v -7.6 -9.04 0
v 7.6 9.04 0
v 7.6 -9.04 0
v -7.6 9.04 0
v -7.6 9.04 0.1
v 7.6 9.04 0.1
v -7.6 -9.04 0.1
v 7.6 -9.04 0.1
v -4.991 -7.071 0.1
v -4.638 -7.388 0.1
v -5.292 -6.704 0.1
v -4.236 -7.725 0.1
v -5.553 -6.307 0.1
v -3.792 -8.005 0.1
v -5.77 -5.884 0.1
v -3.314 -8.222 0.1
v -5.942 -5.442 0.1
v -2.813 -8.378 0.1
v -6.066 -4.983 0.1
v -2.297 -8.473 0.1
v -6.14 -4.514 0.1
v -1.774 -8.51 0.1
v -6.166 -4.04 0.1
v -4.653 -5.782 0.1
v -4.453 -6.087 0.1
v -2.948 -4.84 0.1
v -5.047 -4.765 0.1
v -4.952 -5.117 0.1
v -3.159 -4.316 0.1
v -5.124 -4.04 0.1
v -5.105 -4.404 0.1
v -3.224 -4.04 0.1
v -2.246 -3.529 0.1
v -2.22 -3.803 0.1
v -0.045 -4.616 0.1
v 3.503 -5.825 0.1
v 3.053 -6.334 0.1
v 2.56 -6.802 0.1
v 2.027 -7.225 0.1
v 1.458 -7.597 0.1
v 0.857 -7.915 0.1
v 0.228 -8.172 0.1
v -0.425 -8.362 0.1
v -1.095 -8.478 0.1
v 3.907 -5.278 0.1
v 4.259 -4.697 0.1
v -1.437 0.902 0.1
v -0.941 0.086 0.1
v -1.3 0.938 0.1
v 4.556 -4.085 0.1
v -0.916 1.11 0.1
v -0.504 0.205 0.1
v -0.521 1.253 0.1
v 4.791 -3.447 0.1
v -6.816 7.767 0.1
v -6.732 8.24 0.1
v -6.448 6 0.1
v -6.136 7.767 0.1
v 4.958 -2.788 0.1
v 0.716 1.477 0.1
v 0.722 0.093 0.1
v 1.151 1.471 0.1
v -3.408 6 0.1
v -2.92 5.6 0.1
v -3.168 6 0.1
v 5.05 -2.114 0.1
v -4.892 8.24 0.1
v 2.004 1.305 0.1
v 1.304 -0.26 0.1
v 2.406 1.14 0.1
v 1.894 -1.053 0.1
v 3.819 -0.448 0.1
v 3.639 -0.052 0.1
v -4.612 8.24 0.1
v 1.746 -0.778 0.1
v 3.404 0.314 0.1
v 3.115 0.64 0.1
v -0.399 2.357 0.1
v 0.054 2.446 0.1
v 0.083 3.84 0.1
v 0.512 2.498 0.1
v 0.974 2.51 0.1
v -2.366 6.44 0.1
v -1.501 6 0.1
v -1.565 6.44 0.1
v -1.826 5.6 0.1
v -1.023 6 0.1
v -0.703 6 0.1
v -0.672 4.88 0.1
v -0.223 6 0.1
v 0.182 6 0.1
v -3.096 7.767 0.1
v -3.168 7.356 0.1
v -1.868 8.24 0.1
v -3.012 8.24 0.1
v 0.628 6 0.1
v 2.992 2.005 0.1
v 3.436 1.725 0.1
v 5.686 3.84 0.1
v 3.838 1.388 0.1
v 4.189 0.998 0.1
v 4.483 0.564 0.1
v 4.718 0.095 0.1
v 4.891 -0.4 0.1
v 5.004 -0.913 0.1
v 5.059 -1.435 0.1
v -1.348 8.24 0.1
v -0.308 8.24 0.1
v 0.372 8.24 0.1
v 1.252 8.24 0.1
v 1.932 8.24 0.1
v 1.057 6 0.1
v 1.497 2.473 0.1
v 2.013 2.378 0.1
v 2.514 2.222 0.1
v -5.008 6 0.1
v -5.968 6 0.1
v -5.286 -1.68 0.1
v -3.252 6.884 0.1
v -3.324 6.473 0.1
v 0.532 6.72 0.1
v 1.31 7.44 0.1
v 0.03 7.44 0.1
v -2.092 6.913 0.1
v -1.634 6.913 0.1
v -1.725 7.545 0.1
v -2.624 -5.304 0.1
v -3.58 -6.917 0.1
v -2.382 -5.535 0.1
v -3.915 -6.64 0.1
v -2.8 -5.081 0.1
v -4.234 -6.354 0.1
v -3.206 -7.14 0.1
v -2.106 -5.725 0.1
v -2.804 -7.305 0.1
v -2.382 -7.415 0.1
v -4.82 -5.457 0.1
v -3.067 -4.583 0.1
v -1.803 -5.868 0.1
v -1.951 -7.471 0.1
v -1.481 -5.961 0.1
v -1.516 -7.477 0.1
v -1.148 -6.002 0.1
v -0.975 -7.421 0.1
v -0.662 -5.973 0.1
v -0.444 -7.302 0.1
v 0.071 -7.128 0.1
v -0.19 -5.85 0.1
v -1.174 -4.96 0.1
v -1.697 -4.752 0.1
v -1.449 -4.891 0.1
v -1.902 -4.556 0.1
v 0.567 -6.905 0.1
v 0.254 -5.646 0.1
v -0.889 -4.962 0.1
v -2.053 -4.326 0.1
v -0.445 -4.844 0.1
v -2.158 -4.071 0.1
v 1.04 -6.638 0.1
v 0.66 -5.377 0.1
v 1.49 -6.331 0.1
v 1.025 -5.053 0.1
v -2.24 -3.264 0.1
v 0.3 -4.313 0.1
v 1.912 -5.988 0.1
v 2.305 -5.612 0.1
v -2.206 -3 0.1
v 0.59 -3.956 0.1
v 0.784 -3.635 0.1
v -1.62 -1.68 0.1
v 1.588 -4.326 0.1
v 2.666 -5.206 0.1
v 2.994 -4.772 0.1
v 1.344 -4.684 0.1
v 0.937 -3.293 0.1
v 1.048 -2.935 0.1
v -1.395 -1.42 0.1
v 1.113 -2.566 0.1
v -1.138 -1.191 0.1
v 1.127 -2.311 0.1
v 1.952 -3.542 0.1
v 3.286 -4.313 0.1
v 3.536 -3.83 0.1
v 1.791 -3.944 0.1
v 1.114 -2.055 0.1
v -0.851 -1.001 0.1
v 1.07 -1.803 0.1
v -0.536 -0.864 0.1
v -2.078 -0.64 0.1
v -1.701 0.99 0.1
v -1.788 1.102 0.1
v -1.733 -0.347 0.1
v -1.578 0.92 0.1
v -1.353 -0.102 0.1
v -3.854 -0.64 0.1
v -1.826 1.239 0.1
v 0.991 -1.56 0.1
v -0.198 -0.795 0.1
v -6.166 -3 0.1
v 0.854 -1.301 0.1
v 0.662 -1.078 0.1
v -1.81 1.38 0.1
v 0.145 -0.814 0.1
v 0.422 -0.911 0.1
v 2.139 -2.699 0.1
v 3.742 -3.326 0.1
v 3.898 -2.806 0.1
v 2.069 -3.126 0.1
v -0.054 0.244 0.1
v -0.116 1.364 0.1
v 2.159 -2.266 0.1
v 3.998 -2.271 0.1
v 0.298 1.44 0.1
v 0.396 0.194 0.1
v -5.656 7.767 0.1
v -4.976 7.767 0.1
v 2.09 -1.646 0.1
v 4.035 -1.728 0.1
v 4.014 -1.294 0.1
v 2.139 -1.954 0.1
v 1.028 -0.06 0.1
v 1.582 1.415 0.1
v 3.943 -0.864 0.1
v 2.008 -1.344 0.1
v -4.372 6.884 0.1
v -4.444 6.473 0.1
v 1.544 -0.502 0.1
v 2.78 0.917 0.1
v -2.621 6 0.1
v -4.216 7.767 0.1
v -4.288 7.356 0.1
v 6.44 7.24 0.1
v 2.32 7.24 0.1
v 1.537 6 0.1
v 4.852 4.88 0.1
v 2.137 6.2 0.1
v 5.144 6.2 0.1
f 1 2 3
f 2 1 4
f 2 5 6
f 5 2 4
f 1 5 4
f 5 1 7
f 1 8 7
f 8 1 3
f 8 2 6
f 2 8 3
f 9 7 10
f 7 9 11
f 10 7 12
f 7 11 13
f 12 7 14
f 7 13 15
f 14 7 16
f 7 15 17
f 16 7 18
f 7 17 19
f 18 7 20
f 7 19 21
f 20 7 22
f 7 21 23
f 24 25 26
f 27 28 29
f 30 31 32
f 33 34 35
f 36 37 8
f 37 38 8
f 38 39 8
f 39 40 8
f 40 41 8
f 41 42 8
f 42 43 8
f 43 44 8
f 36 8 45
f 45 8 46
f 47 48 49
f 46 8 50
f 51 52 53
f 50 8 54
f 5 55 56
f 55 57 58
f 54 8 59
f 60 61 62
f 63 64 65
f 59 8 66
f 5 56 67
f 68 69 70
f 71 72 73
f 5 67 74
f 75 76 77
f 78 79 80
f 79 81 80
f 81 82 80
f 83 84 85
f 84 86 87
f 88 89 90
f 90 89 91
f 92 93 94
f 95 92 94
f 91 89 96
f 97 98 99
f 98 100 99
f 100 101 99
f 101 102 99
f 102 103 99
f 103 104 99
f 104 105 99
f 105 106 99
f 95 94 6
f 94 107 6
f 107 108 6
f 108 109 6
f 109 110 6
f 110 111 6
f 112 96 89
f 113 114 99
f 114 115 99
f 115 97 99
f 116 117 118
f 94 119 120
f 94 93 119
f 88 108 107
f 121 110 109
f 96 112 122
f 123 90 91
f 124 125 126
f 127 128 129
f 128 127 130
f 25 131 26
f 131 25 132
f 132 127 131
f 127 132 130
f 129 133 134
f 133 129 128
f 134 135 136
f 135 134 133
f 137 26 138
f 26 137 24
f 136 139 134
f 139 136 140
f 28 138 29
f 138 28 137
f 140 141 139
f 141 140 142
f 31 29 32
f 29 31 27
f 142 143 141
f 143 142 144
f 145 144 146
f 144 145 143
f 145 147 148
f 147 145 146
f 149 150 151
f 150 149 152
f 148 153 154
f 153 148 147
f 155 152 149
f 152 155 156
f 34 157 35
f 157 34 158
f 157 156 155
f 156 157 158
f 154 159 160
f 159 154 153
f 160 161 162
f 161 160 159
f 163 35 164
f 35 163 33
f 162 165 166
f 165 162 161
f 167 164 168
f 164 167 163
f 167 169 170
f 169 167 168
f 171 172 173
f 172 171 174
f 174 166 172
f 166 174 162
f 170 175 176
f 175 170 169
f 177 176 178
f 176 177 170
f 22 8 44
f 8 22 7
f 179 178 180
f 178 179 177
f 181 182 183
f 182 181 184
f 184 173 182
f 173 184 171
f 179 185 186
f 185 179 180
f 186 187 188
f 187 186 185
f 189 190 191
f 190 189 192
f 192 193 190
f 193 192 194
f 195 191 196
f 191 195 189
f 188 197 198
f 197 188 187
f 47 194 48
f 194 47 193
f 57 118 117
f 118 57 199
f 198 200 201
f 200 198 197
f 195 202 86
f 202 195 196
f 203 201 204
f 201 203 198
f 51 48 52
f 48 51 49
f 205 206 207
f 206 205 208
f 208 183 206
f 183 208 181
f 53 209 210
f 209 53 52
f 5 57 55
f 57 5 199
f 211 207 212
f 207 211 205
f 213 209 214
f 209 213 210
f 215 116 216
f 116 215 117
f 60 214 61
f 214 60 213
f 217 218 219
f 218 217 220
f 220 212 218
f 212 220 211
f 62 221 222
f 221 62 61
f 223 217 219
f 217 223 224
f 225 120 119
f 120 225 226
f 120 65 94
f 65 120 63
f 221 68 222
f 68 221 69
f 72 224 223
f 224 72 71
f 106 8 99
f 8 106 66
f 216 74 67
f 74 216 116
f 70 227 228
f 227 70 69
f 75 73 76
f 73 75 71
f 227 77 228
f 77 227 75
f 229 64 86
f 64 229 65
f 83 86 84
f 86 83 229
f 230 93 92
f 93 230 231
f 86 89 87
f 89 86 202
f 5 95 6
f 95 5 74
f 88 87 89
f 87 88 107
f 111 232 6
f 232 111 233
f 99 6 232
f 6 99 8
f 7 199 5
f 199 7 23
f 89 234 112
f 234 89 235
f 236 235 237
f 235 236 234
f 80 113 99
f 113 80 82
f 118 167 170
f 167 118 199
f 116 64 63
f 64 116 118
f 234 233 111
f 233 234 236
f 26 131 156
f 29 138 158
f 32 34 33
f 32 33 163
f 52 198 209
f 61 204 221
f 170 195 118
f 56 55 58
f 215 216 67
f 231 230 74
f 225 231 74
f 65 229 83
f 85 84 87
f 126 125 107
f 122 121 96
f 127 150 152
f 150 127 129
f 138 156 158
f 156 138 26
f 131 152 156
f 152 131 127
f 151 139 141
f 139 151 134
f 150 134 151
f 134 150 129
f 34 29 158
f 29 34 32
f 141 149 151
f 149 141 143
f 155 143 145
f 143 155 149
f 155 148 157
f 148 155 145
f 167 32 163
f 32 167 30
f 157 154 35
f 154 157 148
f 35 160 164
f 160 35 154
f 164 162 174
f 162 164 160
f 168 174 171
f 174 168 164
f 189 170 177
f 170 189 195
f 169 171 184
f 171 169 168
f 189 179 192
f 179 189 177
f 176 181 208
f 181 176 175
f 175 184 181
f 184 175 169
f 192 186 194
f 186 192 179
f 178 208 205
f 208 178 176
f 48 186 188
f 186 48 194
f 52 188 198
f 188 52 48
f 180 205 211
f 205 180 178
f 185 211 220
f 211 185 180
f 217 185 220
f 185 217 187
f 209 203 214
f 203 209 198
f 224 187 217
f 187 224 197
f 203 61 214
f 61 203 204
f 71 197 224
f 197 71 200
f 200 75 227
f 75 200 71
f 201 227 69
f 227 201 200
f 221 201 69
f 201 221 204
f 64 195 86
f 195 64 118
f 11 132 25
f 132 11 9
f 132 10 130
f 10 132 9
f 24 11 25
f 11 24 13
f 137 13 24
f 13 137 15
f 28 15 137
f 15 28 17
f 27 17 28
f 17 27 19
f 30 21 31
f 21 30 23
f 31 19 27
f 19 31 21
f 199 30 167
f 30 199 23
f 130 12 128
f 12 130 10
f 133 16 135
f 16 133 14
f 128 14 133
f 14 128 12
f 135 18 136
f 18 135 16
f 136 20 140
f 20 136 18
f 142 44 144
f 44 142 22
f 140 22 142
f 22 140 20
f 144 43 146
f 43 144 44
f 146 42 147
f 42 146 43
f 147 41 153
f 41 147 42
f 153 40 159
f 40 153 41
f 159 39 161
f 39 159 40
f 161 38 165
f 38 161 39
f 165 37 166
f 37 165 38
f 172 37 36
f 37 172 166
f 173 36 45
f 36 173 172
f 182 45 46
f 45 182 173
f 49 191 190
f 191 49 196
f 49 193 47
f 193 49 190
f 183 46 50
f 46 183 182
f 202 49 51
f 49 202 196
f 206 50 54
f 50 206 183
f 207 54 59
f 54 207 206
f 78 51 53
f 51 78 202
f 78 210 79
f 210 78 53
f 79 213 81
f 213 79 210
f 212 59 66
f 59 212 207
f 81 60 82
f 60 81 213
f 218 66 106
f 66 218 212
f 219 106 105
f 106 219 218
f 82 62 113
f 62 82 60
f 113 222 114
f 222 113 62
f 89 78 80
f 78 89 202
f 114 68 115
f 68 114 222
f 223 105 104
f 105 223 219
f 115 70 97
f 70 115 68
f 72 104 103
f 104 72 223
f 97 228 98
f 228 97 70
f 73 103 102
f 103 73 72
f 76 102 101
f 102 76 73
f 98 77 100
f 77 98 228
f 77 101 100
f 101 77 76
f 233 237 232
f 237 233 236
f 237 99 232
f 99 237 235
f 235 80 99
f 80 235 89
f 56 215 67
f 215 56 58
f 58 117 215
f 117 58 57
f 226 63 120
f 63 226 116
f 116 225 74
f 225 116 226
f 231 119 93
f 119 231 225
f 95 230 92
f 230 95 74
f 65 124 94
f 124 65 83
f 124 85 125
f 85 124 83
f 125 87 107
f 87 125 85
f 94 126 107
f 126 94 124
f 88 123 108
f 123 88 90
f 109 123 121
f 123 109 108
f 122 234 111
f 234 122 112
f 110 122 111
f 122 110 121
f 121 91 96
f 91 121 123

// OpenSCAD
// file: ../p/box5-12.scad
use <../lib.scad>
function ldraw_lib__box5_12() = [
// 0 Box with 5 Faces without Any Edges
// 0 Name: box5-12.dat
// 0 Author: Chris Dee [cwdee]
// 0 !LDRAW_ORG Primitive UPDATE 2009-02
// 0 !LICENSE Licensed under CC BY 4.0 : see CAreadme.txt
// 
// 0 BFC CERTIFY CCW
  [0,"BFC","CERTIFY"],
  [0,"BFC","CCW"],
// 
// 0 !HISTORY 2009-09-03 [PTadmin] Official Update 2009-02
// 
// 
// 4 16 1 1 1 1 1 -1 -1 1 -1 -1 1 1
  [4,16,1,1,1,1,1,-1,-1,1,-1,-1,1,1],
// 4 16 -1 0 1 1 0 1 1 1 1 -1 1 1
  [4,16,-1,0,1,1,0,1,1,1,1,-1,1,1],
// 4 16 -1 0 -1 -1 0 1 -1 1 1 -1 1 -1
  [4,16,-1,0,-1,-1,0,1,-1,1,1,-1,1,-1],
// 4 16 1 0 -1 -1 0 -1 -1 1 -1 1 1 -1
  [4,16,1,0,-1,-1,0,-1,-1,1,-1,1,1,-1],
// 4 16 1 0 1 1 0 -1 1 1 -1 1 1 1
  [4,16,1,0,1,1,0,-1,1,1,-1,1,1,1],
// 0
];
module ldraw_lib__box5_12(step=0, col=false, unit=2/5, alt=false, line=0.2, solid=!$preview)
    makepoly(ldraw_lib__box5_12(), step=step, col=col, unit=unit, alt=alt, line=line, solid=solid);
ldraw_lib__box5_12(line=0.2);
// main file
use <../lib.scad>
use <../p/box5-12.scad>
use <s/821437fs01.scad>
use <s/821437fs02.scad>
function ldraw_lib__821437f() = [
// 0 Sticker  1.9 x  2.3 with Black "TEAM 5" on Clear Background
// 0 Name: 821437f.dat
// 0 Author: Chris Böhnke [KnightOfTarenta]
// 0 !LDRAW_ORG Part UPDATE 2026-05
// 0 !LICENSE Licensed under CC BY 4.0 : see CAreadme.txt
// 
// 0 BFC CERTIFY CCW
  [0,"BFC","CERTIFY"],
  [0,"BFC","CCW"],
// 
// 0 !KEYWORDS Bricklink 5581stk01, Brickowl 997456, Magic Flash, Model Team
// 0 !KEYWORDS Rebrickable 821437, Set 5581, stamp, van
// 
// 0 !HISTORY 2026-05-31 [OrionP] Official Update 2026-05
// 
// 0 // Sticker Back
// 1 16 0 -.25 0 19 0 0 0 .25 0 0 0 22.6 box5-12.dat
  [1,16,0,-.25,0,19,0,0,0,.25,0,0,0,22.6, ldraw_lib__box5_12()],
// 
// 0 // Text Sub-Files
// 1 16 0 0 0 1 0 0 0 1 0 0 0 1 s\821437fs02.dat
  [1,16,0,0,0,1,0,0,0,1,0,0,0,1, ldraw_lib__s__821437fs02()],
// 0 BFC NOCLIP
  [0,"BFC","NOCLIP"],
// 1 0 0 0 0 1 0 0 0 1 0 0 0 1 s\821437fs01.dat
  [1,0,0,0,0,1,0,0,0,1,0,0,0,1, ldraw_lib__s__821437fs01()],
];
module ldraw_lib__821437f(step=0, col=false, unit=2/5, alt=false, line=0.2, solid=!$preview)
    makepoly(ldraw_lib__821437f(), step=step, col=col, unit=unit, alt=alt, line=line, solid=solid);
ldraw_lib__821437f(line=0.2);
